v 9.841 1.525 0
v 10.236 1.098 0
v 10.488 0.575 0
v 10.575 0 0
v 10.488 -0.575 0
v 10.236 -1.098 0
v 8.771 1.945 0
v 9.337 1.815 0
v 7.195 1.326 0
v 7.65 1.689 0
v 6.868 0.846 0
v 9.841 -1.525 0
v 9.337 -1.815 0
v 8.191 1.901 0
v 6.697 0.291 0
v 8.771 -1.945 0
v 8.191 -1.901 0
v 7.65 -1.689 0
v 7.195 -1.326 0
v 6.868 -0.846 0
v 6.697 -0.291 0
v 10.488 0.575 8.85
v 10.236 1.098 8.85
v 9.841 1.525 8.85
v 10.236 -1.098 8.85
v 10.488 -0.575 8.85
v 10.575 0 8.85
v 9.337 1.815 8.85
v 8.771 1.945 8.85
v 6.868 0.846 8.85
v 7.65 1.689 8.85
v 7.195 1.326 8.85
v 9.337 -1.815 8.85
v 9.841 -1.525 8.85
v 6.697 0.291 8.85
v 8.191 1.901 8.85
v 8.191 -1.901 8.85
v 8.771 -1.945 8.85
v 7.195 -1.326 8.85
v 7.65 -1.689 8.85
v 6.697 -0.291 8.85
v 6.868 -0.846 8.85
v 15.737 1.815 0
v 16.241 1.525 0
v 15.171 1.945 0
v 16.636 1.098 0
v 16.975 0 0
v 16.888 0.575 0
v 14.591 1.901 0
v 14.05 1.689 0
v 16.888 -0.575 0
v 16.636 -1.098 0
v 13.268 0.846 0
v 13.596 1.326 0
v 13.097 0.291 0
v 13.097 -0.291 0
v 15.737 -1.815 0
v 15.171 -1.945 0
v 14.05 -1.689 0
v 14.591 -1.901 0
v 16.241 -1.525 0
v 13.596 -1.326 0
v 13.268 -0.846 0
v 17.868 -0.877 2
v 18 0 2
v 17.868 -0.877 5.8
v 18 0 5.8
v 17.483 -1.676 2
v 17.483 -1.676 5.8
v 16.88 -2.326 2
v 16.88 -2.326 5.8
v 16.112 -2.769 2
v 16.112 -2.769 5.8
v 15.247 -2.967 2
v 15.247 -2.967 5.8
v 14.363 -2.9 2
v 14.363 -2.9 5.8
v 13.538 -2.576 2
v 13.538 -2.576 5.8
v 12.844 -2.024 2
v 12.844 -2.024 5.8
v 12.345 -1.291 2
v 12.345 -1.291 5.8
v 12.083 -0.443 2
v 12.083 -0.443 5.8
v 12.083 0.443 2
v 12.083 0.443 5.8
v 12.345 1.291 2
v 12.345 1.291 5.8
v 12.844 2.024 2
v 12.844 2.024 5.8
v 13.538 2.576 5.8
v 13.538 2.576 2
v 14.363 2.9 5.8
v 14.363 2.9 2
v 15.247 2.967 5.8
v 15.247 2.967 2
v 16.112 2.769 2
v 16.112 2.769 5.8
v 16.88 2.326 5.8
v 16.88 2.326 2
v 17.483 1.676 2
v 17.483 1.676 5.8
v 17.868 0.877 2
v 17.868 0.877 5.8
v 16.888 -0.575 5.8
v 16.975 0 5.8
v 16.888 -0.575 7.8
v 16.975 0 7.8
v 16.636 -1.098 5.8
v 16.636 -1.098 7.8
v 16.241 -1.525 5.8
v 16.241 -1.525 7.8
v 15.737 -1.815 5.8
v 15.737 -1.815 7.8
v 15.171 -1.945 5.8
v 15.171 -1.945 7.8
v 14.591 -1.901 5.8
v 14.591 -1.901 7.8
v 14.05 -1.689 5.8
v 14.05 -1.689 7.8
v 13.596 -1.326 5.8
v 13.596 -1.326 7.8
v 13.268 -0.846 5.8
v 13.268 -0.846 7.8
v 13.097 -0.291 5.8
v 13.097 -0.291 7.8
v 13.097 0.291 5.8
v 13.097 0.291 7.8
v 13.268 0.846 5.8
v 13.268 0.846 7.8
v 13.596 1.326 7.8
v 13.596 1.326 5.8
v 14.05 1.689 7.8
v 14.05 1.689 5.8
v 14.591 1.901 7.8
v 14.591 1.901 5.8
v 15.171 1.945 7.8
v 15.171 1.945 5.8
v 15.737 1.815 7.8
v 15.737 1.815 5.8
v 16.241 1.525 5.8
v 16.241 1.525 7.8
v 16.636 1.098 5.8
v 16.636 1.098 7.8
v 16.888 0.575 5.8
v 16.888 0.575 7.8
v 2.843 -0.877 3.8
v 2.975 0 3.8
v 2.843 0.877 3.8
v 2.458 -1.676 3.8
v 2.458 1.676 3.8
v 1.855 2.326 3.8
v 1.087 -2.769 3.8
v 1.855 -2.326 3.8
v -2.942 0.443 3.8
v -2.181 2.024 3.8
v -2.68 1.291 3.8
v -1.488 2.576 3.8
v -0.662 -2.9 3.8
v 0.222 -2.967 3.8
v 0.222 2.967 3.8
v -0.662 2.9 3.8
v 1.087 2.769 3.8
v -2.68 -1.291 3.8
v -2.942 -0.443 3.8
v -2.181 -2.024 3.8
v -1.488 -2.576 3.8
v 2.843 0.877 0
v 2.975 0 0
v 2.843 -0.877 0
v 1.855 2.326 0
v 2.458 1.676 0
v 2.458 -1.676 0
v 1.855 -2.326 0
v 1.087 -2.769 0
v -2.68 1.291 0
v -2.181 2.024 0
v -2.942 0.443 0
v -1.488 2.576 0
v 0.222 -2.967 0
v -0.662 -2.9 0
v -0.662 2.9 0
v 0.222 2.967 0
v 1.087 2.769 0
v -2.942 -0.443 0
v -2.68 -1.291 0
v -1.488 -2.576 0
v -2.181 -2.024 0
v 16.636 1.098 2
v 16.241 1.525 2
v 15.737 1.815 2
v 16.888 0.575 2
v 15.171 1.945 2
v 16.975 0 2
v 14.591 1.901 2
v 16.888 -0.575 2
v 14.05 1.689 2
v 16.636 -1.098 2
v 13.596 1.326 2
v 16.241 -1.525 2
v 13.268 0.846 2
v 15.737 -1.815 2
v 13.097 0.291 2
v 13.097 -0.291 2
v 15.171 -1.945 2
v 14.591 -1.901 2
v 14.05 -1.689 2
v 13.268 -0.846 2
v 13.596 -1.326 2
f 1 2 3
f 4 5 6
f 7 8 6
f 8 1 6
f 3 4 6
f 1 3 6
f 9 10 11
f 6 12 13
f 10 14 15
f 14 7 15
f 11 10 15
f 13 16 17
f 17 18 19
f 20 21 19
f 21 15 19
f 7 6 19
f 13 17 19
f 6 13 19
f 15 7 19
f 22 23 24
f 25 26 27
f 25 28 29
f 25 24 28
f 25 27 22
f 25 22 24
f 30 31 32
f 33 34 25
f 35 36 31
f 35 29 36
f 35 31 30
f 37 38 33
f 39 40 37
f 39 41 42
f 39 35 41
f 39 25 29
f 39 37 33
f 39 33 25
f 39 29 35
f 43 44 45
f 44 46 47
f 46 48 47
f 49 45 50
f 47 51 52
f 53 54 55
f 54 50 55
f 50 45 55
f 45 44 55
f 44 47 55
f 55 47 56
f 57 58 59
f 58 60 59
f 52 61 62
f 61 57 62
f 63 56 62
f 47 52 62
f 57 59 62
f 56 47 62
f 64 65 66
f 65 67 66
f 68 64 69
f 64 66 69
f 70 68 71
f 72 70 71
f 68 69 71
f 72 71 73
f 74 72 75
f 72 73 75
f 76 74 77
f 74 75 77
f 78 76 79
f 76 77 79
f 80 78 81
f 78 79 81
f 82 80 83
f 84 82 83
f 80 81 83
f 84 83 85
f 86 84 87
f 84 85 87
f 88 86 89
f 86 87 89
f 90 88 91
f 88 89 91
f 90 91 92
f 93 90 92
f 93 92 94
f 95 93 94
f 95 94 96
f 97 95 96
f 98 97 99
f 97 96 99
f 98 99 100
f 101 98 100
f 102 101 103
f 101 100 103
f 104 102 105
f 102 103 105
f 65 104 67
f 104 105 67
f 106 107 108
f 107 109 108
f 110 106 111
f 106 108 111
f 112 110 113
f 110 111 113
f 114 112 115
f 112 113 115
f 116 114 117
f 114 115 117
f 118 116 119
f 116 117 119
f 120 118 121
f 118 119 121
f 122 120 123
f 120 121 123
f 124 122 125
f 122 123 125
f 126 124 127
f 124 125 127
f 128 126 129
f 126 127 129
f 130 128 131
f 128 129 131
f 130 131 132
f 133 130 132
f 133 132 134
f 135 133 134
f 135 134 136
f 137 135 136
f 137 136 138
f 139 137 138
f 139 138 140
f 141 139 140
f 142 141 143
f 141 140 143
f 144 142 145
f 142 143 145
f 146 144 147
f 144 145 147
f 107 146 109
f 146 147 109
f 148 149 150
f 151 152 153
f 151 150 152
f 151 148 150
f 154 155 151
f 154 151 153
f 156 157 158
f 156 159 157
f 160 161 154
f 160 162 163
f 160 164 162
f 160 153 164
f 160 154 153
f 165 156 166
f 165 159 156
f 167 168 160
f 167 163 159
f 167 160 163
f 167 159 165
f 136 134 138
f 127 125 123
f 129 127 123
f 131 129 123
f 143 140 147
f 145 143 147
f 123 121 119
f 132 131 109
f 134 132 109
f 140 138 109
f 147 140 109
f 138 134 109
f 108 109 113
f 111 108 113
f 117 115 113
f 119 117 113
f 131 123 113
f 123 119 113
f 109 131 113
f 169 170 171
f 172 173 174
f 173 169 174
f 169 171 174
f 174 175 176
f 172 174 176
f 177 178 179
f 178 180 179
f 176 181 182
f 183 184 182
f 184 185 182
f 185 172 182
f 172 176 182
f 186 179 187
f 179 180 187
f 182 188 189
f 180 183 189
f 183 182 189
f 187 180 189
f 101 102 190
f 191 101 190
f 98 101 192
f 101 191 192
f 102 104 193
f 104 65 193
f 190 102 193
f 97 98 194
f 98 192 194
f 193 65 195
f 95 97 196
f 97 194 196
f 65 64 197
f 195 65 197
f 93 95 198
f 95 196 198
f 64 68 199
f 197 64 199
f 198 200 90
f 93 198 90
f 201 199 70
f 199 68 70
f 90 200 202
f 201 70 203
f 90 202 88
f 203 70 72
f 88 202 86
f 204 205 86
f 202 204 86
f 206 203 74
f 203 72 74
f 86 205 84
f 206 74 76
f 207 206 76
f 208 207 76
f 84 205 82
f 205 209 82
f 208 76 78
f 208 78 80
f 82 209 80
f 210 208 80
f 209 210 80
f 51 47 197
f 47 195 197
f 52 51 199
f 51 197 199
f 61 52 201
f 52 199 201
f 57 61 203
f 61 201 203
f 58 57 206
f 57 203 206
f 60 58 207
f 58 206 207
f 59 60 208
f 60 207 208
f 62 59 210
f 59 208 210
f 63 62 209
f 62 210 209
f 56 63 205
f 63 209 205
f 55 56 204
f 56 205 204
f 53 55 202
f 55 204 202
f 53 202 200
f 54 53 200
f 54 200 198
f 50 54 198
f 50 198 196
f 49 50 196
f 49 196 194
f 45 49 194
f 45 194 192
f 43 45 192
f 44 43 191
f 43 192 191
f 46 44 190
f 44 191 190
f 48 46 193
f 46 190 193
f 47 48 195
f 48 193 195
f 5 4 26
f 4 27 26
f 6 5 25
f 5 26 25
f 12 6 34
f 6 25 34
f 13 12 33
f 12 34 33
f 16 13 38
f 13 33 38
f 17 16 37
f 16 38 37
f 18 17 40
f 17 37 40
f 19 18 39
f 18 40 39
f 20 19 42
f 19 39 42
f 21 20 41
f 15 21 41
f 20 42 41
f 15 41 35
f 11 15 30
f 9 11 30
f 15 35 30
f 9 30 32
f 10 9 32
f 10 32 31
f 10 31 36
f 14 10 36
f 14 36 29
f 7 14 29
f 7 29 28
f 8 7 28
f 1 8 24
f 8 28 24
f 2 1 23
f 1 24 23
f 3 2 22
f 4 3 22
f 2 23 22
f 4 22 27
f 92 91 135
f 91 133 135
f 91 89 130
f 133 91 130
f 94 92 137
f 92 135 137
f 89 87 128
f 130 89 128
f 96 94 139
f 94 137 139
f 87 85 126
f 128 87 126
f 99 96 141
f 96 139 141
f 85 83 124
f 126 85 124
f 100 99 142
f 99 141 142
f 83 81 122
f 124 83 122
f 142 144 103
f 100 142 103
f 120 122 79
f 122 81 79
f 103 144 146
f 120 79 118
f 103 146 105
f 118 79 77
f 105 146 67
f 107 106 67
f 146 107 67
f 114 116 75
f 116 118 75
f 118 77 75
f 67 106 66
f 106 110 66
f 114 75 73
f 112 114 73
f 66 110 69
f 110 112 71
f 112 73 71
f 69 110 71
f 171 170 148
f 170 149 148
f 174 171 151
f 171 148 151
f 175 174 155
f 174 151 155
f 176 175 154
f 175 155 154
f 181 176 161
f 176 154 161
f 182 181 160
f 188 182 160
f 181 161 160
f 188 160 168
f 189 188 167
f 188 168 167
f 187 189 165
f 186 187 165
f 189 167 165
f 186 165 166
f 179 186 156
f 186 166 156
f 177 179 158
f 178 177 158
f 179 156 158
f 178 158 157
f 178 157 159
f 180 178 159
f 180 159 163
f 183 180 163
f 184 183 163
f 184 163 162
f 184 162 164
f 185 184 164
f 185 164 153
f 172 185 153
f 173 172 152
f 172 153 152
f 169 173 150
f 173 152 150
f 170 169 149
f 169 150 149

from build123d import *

# Parameters (mm, degrees)
F0_W = 2.975
F0_H = 3.8
F2_W = 1.95
F2_H = 8.85


with BuildPart() as f1:
    # F0 (on Front) → F1 (revolve)
    with BuildSketch(Plane.XZ):
        with Locations((1.4875, 1.9)):
            Rectangle(F0_W, F0_H)
    revolve(axis=Axis((0, 0, 1.9), (0, 0, -1)))


with BuildPart() as f3:
    # F2 (on Front) → F3 (revolve)
    with BuildSketch(Plane.XZ):
        with Locations((9.599809, 4.425)):
            Rectangle(F2_W, F2_H)
    revolve(axis=Axis((8.624809, 0, 4.425), (0, 0, -1)))


with BuildPart() as f5:
    # F4 (on Front) → F5 (revolve)
    with BuildSketch(Plane.XZ):
        Polygon((15.025032, 7.8), (15.025032, 0), (16.975032, 0), (16.975032, 2), (18.000032, 2), (18.000032, 5.8), (16.975032, 5.8), (16.975032, 7.8), align=None)
    revolve(axis=Axis((15.025032, 0, 3.9), (0, 0, -1)))


solid = Compound([f1.part, f3.part, f5.part])
